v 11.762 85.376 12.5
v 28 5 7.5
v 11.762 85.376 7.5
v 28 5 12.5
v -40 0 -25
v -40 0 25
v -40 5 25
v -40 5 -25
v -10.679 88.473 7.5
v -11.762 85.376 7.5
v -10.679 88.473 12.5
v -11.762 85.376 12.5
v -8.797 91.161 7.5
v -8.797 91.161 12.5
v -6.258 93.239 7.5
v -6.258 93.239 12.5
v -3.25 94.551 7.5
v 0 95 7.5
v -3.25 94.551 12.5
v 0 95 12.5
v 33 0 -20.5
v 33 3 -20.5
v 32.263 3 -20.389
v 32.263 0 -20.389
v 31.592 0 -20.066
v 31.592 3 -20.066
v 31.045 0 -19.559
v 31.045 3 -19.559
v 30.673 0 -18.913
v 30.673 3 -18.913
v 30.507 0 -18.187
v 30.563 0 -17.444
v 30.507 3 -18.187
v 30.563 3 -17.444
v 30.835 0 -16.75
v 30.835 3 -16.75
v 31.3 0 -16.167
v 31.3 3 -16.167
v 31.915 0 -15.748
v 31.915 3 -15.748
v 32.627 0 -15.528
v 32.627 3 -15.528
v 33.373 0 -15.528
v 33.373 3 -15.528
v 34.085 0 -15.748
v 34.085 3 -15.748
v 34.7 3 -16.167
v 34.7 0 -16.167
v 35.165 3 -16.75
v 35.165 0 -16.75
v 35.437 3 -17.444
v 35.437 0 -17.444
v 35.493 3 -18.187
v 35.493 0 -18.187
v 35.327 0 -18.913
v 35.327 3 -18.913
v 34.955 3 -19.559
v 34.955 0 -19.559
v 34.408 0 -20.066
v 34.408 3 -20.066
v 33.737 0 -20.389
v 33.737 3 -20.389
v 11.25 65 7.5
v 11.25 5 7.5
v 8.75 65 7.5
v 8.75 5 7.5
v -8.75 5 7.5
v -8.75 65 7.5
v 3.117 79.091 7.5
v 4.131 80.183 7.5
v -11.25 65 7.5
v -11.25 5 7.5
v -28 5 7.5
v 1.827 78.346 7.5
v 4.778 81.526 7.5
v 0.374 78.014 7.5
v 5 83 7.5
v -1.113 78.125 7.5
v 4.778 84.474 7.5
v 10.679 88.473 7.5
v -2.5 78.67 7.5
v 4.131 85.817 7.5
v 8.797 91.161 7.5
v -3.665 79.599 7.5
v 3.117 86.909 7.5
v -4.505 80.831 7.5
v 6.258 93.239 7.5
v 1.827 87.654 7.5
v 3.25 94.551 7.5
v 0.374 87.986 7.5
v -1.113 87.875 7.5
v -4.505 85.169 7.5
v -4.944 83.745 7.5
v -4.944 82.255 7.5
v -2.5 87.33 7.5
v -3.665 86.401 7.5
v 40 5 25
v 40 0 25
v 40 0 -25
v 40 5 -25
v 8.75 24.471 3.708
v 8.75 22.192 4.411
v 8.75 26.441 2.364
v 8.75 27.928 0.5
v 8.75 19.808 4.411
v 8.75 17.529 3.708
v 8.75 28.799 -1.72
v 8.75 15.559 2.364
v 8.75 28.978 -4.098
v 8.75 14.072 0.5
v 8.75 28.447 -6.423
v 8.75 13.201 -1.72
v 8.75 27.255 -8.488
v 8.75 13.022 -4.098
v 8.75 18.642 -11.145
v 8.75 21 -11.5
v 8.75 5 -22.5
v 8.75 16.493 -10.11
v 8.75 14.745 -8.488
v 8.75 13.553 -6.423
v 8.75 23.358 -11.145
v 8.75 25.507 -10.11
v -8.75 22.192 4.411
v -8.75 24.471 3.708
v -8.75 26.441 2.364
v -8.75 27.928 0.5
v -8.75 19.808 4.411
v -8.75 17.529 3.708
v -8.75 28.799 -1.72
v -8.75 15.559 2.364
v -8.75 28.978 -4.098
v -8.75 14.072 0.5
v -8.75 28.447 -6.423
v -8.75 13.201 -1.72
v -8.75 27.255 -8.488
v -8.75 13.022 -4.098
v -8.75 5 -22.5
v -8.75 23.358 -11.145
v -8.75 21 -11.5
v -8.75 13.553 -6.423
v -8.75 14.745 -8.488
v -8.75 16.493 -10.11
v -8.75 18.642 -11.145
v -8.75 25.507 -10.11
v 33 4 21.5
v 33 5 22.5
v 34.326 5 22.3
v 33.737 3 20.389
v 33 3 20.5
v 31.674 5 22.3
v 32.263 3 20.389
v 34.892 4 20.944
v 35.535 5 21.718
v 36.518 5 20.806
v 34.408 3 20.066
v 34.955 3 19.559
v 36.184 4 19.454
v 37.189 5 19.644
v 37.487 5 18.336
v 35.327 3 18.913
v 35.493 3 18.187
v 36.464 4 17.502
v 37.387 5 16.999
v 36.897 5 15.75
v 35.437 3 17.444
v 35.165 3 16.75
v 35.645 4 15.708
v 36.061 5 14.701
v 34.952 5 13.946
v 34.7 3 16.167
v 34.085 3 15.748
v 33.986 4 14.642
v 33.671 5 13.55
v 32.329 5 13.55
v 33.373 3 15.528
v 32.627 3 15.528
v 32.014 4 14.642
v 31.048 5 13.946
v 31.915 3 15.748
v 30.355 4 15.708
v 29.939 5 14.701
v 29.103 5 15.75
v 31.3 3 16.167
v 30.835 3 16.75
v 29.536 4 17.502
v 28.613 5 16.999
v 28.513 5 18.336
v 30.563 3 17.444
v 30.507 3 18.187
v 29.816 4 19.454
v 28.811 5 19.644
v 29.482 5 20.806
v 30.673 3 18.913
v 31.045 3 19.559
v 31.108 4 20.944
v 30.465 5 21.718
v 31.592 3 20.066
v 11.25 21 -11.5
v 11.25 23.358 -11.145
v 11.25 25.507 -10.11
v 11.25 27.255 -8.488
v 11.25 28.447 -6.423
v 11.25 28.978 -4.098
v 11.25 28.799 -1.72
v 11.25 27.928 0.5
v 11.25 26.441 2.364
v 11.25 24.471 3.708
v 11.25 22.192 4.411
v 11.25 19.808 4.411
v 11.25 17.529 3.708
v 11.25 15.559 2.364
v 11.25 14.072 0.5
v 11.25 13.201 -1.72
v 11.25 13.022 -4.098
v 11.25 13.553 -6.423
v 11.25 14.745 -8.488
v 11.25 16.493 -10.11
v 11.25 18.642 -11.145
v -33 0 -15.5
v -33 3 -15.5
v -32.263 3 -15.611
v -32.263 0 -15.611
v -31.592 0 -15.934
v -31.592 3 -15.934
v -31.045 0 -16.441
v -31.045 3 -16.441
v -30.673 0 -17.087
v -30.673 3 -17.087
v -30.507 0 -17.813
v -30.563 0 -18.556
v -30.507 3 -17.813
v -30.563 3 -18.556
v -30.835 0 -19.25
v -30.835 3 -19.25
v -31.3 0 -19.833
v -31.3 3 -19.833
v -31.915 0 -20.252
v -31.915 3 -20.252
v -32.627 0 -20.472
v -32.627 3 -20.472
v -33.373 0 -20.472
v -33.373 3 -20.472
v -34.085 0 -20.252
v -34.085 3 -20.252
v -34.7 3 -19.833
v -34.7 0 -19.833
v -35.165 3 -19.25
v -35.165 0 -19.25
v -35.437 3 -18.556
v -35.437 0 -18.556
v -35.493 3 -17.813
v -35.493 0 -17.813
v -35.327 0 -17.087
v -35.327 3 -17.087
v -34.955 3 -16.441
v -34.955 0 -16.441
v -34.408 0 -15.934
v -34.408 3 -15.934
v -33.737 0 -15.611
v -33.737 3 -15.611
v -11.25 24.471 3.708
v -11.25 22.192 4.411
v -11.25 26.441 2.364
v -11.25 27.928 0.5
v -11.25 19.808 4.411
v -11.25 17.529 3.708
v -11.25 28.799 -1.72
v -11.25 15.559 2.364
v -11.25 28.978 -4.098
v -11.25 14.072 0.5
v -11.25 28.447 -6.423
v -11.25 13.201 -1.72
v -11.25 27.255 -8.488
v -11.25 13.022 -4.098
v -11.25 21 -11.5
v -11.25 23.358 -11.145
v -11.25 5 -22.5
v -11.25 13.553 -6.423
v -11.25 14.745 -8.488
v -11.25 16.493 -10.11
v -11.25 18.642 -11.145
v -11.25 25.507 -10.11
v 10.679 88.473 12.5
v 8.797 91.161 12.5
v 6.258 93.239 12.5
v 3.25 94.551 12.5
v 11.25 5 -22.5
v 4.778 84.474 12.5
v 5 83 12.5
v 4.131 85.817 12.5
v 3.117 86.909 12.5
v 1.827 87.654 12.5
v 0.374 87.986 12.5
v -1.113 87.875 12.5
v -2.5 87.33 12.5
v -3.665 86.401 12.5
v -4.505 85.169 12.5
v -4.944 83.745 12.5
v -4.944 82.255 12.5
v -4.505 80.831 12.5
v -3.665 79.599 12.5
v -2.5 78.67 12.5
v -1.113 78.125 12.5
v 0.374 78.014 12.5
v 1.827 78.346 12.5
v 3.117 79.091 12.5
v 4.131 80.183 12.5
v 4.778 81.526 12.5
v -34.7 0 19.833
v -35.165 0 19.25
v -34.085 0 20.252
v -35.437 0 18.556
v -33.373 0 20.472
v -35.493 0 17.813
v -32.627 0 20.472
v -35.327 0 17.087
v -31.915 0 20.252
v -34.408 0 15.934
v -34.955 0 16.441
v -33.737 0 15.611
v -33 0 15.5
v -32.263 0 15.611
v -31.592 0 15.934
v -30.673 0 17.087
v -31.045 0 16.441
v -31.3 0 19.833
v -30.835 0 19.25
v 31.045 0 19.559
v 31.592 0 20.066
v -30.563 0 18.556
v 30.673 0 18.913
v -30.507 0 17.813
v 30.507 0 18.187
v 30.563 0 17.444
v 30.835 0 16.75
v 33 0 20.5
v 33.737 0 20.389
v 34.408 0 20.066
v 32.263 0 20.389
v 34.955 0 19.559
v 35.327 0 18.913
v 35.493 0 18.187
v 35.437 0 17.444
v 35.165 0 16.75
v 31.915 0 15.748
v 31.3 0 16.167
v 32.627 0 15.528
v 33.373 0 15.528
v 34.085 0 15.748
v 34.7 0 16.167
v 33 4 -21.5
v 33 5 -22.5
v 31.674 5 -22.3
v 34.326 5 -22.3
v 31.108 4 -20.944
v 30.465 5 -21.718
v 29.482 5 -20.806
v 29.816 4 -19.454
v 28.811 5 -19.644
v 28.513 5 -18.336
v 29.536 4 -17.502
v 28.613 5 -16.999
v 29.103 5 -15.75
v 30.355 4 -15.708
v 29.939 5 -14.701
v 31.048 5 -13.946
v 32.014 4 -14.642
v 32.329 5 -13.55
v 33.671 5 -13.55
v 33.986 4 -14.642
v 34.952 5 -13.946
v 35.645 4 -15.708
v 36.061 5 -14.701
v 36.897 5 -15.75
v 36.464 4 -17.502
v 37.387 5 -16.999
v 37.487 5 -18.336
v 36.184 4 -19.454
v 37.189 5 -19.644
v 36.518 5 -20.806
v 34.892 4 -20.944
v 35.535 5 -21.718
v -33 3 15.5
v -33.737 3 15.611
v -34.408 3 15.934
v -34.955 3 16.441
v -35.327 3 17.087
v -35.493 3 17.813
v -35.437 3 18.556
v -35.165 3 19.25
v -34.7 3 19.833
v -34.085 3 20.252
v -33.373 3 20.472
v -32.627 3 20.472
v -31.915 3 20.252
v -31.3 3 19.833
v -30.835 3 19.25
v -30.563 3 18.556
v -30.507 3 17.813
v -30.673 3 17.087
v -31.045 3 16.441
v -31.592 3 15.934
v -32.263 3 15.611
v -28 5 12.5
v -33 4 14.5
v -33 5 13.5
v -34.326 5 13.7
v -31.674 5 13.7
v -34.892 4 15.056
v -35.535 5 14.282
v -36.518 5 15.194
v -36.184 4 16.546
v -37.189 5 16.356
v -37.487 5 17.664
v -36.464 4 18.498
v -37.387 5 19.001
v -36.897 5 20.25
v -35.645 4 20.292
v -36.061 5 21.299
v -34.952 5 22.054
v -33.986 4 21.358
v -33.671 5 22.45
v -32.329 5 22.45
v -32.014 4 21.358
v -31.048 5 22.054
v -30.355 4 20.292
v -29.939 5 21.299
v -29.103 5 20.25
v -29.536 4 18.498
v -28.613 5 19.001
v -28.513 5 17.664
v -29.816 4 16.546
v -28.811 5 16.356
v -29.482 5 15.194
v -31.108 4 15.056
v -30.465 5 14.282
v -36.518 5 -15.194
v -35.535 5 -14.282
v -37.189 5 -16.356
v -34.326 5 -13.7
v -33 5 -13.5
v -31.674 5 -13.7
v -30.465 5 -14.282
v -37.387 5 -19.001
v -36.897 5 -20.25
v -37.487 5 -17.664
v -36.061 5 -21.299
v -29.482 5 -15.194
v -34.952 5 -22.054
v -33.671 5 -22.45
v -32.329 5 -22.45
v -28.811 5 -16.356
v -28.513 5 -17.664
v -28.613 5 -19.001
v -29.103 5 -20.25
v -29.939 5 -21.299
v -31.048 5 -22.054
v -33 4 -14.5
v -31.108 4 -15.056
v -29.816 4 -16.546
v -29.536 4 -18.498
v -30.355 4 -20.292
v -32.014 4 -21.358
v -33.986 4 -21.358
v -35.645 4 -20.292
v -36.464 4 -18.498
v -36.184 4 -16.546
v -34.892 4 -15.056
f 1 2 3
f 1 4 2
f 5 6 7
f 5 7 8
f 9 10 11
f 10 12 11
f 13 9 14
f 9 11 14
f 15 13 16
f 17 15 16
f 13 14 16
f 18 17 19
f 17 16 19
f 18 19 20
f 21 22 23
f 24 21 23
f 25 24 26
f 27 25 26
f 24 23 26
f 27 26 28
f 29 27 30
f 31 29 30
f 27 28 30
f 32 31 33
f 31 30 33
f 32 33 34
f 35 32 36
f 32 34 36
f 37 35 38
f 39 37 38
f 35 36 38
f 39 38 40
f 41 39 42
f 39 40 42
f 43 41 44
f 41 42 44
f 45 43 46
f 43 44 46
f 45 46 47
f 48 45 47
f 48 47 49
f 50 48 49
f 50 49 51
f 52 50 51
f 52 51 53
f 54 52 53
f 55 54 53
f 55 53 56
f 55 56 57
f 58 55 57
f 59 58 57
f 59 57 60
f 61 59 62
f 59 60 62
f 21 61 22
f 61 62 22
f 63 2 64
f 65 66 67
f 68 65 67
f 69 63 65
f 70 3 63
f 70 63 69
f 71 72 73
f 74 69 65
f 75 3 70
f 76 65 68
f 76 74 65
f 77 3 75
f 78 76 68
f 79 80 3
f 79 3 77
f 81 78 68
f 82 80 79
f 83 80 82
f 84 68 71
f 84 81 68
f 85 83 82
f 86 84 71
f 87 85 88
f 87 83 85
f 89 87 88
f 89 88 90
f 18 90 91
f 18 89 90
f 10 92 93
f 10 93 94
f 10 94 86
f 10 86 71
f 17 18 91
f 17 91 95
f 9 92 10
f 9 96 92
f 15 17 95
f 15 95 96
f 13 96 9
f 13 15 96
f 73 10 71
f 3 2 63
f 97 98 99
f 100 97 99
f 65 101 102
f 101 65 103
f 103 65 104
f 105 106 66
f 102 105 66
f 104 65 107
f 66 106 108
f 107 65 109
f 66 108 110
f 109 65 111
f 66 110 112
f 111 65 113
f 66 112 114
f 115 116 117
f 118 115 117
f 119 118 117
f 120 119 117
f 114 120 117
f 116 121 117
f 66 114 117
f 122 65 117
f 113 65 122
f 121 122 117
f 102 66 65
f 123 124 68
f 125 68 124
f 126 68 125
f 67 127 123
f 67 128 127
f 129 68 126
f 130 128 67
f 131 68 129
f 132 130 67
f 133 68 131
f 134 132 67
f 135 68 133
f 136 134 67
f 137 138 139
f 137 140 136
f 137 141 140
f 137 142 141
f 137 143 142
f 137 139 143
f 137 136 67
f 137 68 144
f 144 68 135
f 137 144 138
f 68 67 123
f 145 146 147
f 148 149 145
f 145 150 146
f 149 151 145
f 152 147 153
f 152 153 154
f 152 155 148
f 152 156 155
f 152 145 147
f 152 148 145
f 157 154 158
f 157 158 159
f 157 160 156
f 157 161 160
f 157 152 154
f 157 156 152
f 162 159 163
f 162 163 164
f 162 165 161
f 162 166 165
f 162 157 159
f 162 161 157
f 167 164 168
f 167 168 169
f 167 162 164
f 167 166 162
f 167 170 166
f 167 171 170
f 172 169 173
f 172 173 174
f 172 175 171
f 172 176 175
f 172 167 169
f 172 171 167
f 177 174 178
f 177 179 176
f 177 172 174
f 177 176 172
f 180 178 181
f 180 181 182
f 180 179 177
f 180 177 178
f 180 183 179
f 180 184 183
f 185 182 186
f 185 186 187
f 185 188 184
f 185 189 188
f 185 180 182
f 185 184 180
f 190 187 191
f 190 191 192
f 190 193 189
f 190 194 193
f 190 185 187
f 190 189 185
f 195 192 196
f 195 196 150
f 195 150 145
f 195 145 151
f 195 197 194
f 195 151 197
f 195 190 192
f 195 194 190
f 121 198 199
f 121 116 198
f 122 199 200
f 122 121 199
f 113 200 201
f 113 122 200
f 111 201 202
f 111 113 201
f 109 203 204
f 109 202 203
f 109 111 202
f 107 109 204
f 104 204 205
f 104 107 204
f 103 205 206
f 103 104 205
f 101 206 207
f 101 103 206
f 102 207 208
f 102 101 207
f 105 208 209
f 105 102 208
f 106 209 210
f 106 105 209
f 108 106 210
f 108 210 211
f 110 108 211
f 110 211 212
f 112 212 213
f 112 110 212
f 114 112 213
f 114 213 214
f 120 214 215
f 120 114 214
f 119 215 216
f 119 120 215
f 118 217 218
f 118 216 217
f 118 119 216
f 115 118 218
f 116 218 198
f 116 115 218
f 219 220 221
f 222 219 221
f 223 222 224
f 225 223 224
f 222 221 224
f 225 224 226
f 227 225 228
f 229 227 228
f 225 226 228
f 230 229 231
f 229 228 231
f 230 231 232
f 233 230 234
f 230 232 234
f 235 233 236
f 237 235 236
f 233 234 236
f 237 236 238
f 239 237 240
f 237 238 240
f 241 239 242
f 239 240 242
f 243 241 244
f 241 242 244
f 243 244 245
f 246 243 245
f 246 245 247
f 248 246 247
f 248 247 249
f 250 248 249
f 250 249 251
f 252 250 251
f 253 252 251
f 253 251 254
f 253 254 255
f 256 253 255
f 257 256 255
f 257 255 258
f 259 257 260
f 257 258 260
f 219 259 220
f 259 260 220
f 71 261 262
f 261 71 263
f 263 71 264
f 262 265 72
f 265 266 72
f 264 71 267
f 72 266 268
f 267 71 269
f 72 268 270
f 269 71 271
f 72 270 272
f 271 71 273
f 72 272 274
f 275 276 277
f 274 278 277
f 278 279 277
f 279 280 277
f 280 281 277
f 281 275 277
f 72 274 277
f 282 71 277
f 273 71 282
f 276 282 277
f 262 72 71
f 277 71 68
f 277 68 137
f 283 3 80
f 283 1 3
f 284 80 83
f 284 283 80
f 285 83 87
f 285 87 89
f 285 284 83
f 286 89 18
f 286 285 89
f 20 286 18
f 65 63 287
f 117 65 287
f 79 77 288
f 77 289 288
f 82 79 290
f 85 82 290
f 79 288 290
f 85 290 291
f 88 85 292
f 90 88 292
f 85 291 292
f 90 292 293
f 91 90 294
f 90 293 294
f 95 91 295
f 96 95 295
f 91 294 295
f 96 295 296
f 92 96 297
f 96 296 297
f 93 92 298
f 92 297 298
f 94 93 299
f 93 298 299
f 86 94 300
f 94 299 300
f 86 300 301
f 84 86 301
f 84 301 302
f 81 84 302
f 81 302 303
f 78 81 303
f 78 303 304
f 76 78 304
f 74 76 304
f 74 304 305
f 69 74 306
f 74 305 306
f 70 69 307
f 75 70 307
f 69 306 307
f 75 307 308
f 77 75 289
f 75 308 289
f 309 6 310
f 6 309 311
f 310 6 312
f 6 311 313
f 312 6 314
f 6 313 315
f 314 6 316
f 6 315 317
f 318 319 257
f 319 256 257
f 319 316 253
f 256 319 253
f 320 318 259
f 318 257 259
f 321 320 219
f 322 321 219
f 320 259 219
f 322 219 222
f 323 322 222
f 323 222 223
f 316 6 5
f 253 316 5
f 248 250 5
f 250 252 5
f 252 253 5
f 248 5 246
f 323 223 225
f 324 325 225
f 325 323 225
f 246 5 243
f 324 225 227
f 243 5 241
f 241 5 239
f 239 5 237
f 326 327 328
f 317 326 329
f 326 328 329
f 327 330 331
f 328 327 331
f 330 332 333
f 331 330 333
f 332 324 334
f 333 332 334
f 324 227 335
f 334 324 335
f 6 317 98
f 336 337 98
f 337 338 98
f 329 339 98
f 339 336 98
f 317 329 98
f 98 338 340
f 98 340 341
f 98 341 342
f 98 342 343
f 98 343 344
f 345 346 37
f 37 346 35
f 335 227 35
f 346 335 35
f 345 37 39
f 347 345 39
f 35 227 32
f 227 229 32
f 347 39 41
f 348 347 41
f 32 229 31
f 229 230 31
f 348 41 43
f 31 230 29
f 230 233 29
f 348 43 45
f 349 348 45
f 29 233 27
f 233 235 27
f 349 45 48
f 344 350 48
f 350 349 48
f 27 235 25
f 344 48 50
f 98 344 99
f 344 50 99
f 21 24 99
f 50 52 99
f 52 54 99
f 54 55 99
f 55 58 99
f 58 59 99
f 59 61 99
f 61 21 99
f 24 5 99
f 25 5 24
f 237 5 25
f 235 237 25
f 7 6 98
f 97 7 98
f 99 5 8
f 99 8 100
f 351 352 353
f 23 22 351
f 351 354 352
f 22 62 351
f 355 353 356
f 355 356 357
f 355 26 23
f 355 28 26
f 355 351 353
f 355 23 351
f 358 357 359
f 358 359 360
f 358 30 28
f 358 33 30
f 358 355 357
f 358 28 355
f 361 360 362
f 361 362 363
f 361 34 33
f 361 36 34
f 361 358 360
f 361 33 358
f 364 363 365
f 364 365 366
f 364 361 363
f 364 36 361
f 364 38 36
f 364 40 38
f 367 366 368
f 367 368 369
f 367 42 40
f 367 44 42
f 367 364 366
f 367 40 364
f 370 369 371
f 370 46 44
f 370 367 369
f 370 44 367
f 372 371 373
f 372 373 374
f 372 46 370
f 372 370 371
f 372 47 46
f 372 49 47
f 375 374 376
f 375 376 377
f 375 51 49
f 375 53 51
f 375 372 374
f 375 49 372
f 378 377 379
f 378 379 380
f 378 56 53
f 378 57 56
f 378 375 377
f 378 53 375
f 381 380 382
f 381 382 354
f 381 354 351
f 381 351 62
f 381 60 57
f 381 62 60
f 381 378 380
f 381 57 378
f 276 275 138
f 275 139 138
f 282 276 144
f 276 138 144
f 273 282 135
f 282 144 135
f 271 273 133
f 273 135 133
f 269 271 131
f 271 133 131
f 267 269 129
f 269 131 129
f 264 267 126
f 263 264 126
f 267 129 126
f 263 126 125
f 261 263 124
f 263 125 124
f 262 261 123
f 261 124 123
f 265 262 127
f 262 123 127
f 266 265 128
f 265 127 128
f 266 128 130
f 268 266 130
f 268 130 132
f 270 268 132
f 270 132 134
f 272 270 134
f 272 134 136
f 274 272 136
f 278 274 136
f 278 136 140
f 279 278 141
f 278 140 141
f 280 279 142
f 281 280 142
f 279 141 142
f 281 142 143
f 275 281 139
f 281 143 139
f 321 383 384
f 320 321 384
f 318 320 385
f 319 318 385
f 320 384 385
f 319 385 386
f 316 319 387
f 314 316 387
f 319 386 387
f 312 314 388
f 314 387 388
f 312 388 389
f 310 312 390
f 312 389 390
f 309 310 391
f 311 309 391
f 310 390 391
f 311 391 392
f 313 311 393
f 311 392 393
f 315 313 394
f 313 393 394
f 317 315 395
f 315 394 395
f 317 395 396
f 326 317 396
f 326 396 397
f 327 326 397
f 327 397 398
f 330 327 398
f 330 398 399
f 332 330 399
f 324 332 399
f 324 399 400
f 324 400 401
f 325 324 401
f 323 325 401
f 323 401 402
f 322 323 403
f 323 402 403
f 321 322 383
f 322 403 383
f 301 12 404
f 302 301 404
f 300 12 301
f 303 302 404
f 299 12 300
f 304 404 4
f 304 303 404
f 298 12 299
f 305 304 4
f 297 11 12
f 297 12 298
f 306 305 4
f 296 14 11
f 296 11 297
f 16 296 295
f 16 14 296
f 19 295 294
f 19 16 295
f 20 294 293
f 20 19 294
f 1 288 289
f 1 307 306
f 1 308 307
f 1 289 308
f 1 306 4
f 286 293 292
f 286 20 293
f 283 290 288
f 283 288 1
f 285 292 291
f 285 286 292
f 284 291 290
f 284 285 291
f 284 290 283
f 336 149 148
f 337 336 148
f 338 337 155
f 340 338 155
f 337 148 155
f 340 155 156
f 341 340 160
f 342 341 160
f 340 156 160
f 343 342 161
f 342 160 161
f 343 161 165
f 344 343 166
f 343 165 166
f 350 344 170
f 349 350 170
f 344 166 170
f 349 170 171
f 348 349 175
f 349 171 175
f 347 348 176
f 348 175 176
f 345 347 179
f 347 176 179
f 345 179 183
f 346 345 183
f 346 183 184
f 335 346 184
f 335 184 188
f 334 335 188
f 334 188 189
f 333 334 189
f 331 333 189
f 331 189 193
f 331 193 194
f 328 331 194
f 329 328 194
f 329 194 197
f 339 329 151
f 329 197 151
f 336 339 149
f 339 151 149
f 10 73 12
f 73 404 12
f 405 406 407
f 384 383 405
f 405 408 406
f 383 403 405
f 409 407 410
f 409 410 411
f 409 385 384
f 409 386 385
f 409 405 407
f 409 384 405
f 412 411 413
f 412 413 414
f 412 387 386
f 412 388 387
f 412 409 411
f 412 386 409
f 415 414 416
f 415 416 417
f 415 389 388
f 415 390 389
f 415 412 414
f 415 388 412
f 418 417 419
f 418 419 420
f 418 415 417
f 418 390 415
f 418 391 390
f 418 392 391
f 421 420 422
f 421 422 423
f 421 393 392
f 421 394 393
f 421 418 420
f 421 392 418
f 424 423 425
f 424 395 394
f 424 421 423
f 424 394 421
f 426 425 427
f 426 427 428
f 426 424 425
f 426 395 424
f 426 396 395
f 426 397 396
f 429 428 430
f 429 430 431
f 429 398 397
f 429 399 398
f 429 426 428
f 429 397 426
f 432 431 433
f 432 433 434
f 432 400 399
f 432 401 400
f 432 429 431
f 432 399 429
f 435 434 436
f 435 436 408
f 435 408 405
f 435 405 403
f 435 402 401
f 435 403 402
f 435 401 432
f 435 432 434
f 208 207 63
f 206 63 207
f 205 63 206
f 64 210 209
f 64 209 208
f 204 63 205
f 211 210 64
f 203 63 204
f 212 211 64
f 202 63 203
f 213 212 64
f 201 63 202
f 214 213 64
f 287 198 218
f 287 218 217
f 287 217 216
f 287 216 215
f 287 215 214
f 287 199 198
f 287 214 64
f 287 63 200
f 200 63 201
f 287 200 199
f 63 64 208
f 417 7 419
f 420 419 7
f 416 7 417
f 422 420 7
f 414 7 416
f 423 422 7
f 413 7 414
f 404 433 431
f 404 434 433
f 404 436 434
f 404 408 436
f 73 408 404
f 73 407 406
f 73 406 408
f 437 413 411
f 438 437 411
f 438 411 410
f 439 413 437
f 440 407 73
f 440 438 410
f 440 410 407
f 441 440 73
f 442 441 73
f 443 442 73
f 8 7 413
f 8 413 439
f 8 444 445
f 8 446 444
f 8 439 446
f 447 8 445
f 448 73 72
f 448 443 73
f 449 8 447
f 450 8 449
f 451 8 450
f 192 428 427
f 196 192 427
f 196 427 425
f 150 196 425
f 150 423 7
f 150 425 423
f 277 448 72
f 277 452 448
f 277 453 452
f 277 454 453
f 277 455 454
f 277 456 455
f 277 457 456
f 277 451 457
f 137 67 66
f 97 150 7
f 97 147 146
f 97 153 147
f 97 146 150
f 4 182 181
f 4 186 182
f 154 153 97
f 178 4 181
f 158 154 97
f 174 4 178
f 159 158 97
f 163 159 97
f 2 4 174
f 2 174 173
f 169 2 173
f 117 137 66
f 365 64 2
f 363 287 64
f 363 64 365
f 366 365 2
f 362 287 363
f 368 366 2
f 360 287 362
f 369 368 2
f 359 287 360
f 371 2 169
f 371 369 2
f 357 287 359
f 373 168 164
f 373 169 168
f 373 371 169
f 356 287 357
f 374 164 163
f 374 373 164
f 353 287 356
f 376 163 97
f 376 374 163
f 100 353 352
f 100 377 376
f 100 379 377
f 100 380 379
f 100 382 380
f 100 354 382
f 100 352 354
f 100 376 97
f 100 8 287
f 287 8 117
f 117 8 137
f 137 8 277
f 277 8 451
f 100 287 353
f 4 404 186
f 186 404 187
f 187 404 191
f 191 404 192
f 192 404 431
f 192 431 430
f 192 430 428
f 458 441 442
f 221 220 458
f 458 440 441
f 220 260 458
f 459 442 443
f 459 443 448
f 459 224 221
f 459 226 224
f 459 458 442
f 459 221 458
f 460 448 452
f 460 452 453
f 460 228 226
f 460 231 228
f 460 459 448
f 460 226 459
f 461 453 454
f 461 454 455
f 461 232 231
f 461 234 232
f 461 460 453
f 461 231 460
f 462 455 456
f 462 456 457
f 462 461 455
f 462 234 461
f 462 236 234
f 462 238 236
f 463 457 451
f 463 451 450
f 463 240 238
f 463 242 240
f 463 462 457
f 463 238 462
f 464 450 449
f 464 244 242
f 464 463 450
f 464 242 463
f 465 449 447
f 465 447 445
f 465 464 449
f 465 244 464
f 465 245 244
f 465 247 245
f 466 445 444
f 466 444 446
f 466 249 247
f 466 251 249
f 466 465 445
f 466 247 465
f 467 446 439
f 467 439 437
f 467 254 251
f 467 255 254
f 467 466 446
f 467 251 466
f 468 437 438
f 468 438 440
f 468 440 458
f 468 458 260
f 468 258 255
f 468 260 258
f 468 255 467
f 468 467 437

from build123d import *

# Parameters (mm, degrees)
SKETCH2_W           = 80
SKETCH2_H           = 50
BOSS_EXTRUDE1_DEPTH = 5
BOSS_EXTRUDE2_DEPTH = 2.5
RIB1_REACH          = 112.227
SKETCH6_WALL_W      = 289.536116176
SKETCH6_WALL_H      = 2.5
SKETCH7_R           = 8
CUT_EXTRUDE1_DEPTH  = 2.5
SKETCH3_R           = 2.5
CUT_EXTRUDE2_DEPTH  = 5
CHAMFER1_SIZE       = 2
SKETCH8_R           = 5
CUT_EXTRUDE3_DEPTH  = 2.5


with BuildPart() as part:
    # Sketch2 → Boss-Extrude1 (new body)
    with BuildSketch(Plane(origin=(0, 0, 0), x_dir=(1, 0, 0), z_dir=(0, 1, 0))):
        Rectangle(SKETCH2_W, SKETCH2_H)
    extrude(amount=BOSS_EXTRUDE1_DEPTH)

    # Sketch4 → Boss-Extrude2 (add, symmetric)
    with BuildSketch(Plane.XY.offset(10)):
        with BuildLine():
            Line((0, 5), (-28, 5))
            Line((-28, 5), (-11.762376238, 85.376237624))
            ThreePointArc((-11.762376238, 85.376237624), (-7.598853483, 92.28748759), (0, 95))
            Line((0, 95), (0, 83))
            Line((0, 83), (0, 5))
        make_face()
    boss_extrude2 = extrude(amount=BOSS_EXTRUDE2_DEPTH, both=True)

    # Sketch6 wall → Rib1 (add, up to next)
    with BuildSketch(Plane(origin=(-10, 35, -7.5), x_dir=(0, -0.894427191, -0.4472135955), z_dir=(0, 0.4472135955, -0.894427191)), mode=Mode.PRIVATE) as rib1_sk1:
        Rectangle(SKETCH6_WALL_W, SKETCH6_WALL_H)
    rib1_tool1 = extrude(rib1_sk1.sketch, amount=-RIB1_REACH, mode=Mode.PRIVATE) - part.part
    rib1 = rib1_tool1.solids().sort_by_distance((-10, 35, -7.5))[0]
    add(rib1)

    # Sketch7 → Cut-Extrude1 (cut, symmetric)
    with BuildSketch(Plane(origin=(-10, 0, 0), x_dir=(0, 0, -1), z_dir=(1, 0, 0))):
        with Locations((3.5, 21)):
            Circle(SKETCH7_R)
    cut_extrude1 = extrude(amount=CUT_EXTRUDE1_DEPTH, both=True, mode=Mode.SUBTRACT)

    # Mirror2: Boss-Extrude2, Rib1, Cut-Extrude1 across plane
    add(boss_extrude2.mirror(Plane(origin=(0, 83, 7.5), x_dir=(0, 0, 1), z_dir=(1, 0, 0))))
    add(rib1.mirror(Plane(origin=(0, 83, 7.5), x_dir=(0, 0, 1), z_dir=(1, 0, 0))))
    add(cut_extrude1.mirror(Plane(origin=(0, 83, 7.5), x_dir=(0, 0, 1), z_dir=(1, 0, 0))), mode=Mode.SUBTRACT)

    # Sketch3 → Cut-Extrude2 (cut)
    with BuildSketch(Plane(origin=(0, 5, 0), x_dir=(1, 0, 0), z_dir=(0, 1, 0))):
        with Locations(Location((-33, 18, 0), (0, 0, 270))):
            Circle(SKETCH3_R)
        with Locations(Location((-33, -18, 0), (0, 0, 90))):
            Circle(SKETCH3_R)
        with Locations(Location((33, -18, 0), (0, 0, 270))):
            Circle(SKETCH3_R)
        with Locations(Location((33, 18, 0), (0, 0, 90))):
            Circle(SKETCH3_R)
    extrude(amount=-CUT_EXTRUDE2_DEPTH, mode=Mode.SUBTRACT)

    # Chamfer1
    chamfer1_edges = [part.edges().sort_by_distance(p)[0] for p in [
        (33, 5, -15.5),
        (33, 5, 15.5),
        (-33, 5, 20.5),
        (-33, 5, -20.5),
    ]]
    chamfer(chamfer1_edges, length=CHAMFER1_SIZE)

    # Sketch8 → Cut-Extrude3 (cut, symmetric)
    with BuildSketch(Plane.XY.offset(10)):
        with Locations((0, 83)):
            Circle(SKETCH8_R)
    extrude(amount=CUT_EXTRUDE3_DEPTH, both=True, mode=Mode.SUBTRACT)


solid = part.part
